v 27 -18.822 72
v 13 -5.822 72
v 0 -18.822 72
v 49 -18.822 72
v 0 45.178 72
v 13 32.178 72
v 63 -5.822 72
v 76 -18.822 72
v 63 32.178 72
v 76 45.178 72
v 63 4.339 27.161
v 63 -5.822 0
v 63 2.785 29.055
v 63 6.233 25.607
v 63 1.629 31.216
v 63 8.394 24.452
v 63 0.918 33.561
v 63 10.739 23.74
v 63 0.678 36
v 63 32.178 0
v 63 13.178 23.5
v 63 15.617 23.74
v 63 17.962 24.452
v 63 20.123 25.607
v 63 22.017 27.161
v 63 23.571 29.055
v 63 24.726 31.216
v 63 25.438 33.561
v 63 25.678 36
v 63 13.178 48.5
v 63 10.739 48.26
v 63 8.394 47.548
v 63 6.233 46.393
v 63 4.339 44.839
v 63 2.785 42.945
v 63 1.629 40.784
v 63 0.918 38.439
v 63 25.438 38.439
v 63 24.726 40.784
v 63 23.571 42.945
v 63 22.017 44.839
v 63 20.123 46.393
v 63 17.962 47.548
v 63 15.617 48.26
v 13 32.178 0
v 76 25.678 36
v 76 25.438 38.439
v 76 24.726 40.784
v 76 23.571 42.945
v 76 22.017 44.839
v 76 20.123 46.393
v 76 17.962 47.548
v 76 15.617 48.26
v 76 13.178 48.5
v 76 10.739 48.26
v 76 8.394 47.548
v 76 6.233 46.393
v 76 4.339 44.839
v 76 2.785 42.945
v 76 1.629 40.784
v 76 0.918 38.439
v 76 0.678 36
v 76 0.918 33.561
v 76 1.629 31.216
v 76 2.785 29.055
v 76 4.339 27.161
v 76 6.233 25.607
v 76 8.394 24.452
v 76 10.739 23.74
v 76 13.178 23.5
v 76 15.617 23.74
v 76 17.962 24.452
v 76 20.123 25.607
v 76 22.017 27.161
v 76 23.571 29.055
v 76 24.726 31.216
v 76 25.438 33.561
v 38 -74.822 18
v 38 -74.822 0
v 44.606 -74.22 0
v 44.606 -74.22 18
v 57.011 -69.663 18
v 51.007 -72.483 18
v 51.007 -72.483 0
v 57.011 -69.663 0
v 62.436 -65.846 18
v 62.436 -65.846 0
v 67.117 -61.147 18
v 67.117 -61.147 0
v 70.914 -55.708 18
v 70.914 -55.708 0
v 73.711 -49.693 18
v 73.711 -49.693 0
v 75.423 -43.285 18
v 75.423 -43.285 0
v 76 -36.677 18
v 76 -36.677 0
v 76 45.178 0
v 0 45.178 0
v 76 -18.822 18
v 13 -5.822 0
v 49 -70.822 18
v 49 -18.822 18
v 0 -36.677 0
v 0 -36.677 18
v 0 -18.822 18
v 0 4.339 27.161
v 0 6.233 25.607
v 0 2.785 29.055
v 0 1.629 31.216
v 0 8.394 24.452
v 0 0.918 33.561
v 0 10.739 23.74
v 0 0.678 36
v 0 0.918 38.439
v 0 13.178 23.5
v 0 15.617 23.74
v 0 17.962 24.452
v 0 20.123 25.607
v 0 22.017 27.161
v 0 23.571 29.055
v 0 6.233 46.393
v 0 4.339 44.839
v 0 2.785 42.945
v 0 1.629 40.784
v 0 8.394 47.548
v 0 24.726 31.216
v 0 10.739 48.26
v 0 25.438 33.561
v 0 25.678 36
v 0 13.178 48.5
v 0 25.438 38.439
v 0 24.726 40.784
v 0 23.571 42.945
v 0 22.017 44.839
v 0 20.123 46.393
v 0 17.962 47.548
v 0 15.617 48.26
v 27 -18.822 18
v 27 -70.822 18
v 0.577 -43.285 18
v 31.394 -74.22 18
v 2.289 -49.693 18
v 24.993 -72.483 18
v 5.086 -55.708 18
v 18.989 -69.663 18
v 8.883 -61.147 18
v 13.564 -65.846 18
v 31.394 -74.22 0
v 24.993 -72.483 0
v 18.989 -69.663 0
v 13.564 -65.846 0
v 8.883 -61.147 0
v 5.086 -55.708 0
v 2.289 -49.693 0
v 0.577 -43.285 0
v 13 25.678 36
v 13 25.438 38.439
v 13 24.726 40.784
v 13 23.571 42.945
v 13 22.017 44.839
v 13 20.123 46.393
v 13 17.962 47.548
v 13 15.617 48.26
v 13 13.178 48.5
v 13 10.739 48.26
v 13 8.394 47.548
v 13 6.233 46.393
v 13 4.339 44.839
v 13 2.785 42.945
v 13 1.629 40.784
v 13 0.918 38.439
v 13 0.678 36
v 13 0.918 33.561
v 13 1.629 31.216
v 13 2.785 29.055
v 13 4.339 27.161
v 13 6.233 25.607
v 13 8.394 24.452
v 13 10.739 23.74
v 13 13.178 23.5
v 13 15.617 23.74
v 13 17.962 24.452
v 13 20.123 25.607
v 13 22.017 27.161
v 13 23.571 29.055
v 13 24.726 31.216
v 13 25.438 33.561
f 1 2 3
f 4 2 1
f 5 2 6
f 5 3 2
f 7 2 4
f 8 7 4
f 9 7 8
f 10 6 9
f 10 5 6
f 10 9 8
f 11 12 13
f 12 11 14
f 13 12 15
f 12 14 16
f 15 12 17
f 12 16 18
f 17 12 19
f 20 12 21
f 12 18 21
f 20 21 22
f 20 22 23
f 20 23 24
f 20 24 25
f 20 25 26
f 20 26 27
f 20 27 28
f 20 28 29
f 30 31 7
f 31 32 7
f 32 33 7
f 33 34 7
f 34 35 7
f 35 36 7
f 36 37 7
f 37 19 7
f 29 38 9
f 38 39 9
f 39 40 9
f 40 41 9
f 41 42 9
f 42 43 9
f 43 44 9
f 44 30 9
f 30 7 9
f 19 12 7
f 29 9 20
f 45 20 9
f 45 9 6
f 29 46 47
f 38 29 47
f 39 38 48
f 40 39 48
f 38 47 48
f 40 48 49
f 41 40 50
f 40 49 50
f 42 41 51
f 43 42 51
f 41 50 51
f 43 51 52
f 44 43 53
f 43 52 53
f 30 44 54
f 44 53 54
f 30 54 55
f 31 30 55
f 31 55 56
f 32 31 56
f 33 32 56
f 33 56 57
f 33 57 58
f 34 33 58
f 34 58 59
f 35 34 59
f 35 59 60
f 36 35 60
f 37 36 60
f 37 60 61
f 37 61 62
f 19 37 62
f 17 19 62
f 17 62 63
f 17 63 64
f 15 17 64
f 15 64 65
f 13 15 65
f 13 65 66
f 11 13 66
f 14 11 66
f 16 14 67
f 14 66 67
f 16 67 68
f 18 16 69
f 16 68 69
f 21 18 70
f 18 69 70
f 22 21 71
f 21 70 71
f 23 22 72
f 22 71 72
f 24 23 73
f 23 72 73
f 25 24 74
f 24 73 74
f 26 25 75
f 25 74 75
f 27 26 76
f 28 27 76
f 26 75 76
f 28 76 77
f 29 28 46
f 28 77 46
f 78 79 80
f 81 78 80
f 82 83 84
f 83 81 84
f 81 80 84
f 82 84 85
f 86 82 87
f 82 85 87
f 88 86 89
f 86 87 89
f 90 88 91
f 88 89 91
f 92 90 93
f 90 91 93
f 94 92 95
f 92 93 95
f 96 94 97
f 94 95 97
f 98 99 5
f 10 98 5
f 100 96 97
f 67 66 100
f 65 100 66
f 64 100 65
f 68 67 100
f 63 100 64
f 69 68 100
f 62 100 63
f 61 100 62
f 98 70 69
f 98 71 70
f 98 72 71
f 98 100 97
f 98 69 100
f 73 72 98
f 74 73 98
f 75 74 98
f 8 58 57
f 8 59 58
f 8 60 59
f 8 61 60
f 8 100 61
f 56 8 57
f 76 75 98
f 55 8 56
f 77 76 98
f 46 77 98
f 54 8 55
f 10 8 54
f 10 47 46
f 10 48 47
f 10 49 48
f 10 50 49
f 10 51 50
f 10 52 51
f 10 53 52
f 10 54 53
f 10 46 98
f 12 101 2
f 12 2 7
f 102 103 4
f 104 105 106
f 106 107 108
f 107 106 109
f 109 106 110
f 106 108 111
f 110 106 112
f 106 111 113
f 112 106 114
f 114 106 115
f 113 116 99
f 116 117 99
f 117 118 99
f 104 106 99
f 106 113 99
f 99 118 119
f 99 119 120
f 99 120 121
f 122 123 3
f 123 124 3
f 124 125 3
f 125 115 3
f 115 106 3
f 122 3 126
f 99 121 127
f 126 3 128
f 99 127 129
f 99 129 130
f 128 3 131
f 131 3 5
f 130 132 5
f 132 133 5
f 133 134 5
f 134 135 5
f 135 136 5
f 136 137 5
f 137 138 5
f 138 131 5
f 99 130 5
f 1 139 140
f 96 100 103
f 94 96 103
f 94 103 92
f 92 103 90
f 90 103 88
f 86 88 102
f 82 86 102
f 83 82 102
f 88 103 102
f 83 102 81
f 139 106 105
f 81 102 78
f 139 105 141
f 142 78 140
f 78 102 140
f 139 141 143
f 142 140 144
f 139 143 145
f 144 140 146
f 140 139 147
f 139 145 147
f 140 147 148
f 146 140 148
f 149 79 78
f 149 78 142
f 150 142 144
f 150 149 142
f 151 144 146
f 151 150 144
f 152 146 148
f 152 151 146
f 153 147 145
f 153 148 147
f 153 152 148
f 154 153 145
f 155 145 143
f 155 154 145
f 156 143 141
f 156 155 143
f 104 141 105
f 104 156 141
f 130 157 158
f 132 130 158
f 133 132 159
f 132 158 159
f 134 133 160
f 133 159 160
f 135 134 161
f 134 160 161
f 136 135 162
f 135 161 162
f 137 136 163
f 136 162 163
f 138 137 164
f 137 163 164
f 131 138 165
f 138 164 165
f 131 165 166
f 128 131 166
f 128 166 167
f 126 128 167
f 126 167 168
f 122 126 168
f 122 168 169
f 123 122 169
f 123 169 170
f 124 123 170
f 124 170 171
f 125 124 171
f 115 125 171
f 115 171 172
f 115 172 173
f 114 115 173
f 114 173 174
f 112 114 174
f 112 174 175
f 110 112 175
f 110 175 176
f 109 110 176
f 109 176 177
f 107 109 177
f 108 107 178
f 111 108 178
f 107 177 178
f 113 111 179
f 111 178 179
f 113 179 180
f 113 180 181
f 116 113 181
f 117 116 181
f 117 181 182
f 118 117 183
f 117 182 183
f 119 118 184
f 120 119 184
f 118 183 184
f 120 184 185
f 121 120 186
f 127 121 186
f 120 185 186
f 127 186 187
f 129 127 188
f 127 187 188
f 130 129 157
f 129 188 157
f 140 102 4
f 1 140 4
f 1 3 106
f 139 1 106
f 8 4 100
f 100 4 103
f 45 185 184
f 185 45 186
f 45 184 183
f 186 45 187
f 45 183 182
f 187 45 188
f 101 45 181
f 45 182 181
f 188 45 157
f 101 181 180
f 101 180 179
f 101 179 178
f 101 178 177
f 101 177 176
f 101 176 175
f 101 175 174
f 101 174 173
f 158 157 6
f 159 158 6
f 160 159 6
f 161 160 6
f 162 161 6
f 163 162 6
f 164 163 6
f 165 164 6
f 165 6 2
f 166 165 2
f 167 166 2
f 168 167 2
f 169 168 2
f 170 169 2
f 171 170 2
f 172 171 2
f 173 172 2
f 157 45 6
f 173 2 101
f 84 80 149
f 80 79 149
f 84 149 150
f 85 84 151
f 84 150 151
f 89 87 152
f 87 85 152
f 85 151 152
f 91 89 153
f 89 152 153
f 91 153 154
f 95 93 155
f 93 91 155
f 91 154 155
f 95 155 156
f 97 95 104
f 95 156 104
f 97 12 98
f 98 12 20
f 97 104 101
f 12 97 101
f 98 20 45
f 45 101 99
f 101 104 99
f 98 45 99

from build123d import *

# Parameters (mm, degrees)
F2_DEPTH    = 76
F3_R        = 12.5
F4_DEPTH    = 127.1
F6_DEPTH    = 53.4
F7_T1_DEPTH = 208.7228714275
F8_W        = 11
F8_H        = 54
F9_DEPTH    = 52
F10_W       = 11
F10_H       = 54
F11_DEPTH   = 52
F13_DEPTH   = 67.9
F14_W       = 50
F14_H       = 38
F15_DEPTH   = 79.6


# Not quite as in the source:
# - a fillet or chamfer that OpenCascade refuses, or shapes differently, is made with other operations: its cross-section is extruded or revolved along the edge and cut away or added


with BuildPart() as f2:
    # F1 (on Right) → F2 (new body)
    with BuildSketch(Plane.YZ):
        Polygon((-74.8220309615, 18), (-74.8220309615, 0), (45.1779690385, 0), (45.1779690385, 72), (-18.8220309615, 72), (-18.8220309615, 18), align=None)
    extrude(amount=F2_DEPTH)

    # F3 (on face) → F4 (cut)
    with BuildSketch(Plane.YZ.offset(76)):
        with Locations((13.1779690385, 36)):
            Circle(F3_R)
    extrude(amount=-F4_DEPTH, mode=Mode.SUBTRACT)

    # F5 (on face) → F6 (cut)
    with BuildSketch(Plane.XY.offset(72)):
        Polygon((13, 32.1779690385), (13, 13.1779690385), (13, -5.8220309615), (28.5150296986, -5.8220309615), (63, -5.8220309615), (63, 16.2556339055), (63, 32.1779690385), (35.4323200881, 32.1779690385), align=None)
    extrude(amount=-F6_DEPTH, mode=Mode.SUBTRACT)

    # F7: fillet of radius 38.1445742855 on 2 edges, made by hand

    # F7_s2 → F7_t1 (cut)
    with BuildSketch(Plane.XY.offset(-95.3614357137)):
        with BuildLine():
            ThreePointArc((38.1445742855, -74.8220309615), (11.1722871427, -63.6497438188), (0, -36.677456676))
            Line((0, -36.677456676), (0, -74.8220309615))
            Line((0, -74.8220309615), (38.1445742855, -74.8220309615))
        make_face()
        with BuildLine():
            ThreePointArc((37.8554257145, -74.8220309615), (64.8277128573, -63.6497438188), (76, -36.677456676))
            Line((76, -36.677456676), (76, -74.8220309615))
            Line((76, -74.8220309615), (37.8554257145, -74.8220309615))
        make_face()
    extrude(amount=F7_T1_DEPTH, mode=Mode.SUBTRACT)

    # F8 (on face) → F9 (join)
    with BuildSketch(Plane.XZ.offset(18.8220309615)):
        with Locations((32.5, 45)):
            Rectangle(F8_W, F8_H)
    extrude(amount=F9_DEPTH)

    # F10 (on face) → F11 (join)
    with BuildSketch(Plane.XZ.offset(18.8220309615)):
        with Locations((43.5, 45)):
            Rectangle(F10_W, F10_H)
    extrude(amount=F11_DEPTH)

    # F12 (on face) → F13 (cut)
    with BuildSketch(Plane.YZ.offset(49)):
        Polygon((-70.8220309615, 72), (-70.8220309615, 18), (-18.8220309615, 72), align=None)
    extrude(amount=-F13_DEPTH, mode=Mode.SUBTRACT)

    # F14 (on face) → F15 (cut)
    with BuildSketch(Plane.XY.offset(18.6)):
        with Locations((38, 13.1779690385)):
            Rectangle(F14_W, F14_H)
    extrude(amount=-F15_DEPTH, mode=Mode.SUBTRACT)


solid = f2.part
